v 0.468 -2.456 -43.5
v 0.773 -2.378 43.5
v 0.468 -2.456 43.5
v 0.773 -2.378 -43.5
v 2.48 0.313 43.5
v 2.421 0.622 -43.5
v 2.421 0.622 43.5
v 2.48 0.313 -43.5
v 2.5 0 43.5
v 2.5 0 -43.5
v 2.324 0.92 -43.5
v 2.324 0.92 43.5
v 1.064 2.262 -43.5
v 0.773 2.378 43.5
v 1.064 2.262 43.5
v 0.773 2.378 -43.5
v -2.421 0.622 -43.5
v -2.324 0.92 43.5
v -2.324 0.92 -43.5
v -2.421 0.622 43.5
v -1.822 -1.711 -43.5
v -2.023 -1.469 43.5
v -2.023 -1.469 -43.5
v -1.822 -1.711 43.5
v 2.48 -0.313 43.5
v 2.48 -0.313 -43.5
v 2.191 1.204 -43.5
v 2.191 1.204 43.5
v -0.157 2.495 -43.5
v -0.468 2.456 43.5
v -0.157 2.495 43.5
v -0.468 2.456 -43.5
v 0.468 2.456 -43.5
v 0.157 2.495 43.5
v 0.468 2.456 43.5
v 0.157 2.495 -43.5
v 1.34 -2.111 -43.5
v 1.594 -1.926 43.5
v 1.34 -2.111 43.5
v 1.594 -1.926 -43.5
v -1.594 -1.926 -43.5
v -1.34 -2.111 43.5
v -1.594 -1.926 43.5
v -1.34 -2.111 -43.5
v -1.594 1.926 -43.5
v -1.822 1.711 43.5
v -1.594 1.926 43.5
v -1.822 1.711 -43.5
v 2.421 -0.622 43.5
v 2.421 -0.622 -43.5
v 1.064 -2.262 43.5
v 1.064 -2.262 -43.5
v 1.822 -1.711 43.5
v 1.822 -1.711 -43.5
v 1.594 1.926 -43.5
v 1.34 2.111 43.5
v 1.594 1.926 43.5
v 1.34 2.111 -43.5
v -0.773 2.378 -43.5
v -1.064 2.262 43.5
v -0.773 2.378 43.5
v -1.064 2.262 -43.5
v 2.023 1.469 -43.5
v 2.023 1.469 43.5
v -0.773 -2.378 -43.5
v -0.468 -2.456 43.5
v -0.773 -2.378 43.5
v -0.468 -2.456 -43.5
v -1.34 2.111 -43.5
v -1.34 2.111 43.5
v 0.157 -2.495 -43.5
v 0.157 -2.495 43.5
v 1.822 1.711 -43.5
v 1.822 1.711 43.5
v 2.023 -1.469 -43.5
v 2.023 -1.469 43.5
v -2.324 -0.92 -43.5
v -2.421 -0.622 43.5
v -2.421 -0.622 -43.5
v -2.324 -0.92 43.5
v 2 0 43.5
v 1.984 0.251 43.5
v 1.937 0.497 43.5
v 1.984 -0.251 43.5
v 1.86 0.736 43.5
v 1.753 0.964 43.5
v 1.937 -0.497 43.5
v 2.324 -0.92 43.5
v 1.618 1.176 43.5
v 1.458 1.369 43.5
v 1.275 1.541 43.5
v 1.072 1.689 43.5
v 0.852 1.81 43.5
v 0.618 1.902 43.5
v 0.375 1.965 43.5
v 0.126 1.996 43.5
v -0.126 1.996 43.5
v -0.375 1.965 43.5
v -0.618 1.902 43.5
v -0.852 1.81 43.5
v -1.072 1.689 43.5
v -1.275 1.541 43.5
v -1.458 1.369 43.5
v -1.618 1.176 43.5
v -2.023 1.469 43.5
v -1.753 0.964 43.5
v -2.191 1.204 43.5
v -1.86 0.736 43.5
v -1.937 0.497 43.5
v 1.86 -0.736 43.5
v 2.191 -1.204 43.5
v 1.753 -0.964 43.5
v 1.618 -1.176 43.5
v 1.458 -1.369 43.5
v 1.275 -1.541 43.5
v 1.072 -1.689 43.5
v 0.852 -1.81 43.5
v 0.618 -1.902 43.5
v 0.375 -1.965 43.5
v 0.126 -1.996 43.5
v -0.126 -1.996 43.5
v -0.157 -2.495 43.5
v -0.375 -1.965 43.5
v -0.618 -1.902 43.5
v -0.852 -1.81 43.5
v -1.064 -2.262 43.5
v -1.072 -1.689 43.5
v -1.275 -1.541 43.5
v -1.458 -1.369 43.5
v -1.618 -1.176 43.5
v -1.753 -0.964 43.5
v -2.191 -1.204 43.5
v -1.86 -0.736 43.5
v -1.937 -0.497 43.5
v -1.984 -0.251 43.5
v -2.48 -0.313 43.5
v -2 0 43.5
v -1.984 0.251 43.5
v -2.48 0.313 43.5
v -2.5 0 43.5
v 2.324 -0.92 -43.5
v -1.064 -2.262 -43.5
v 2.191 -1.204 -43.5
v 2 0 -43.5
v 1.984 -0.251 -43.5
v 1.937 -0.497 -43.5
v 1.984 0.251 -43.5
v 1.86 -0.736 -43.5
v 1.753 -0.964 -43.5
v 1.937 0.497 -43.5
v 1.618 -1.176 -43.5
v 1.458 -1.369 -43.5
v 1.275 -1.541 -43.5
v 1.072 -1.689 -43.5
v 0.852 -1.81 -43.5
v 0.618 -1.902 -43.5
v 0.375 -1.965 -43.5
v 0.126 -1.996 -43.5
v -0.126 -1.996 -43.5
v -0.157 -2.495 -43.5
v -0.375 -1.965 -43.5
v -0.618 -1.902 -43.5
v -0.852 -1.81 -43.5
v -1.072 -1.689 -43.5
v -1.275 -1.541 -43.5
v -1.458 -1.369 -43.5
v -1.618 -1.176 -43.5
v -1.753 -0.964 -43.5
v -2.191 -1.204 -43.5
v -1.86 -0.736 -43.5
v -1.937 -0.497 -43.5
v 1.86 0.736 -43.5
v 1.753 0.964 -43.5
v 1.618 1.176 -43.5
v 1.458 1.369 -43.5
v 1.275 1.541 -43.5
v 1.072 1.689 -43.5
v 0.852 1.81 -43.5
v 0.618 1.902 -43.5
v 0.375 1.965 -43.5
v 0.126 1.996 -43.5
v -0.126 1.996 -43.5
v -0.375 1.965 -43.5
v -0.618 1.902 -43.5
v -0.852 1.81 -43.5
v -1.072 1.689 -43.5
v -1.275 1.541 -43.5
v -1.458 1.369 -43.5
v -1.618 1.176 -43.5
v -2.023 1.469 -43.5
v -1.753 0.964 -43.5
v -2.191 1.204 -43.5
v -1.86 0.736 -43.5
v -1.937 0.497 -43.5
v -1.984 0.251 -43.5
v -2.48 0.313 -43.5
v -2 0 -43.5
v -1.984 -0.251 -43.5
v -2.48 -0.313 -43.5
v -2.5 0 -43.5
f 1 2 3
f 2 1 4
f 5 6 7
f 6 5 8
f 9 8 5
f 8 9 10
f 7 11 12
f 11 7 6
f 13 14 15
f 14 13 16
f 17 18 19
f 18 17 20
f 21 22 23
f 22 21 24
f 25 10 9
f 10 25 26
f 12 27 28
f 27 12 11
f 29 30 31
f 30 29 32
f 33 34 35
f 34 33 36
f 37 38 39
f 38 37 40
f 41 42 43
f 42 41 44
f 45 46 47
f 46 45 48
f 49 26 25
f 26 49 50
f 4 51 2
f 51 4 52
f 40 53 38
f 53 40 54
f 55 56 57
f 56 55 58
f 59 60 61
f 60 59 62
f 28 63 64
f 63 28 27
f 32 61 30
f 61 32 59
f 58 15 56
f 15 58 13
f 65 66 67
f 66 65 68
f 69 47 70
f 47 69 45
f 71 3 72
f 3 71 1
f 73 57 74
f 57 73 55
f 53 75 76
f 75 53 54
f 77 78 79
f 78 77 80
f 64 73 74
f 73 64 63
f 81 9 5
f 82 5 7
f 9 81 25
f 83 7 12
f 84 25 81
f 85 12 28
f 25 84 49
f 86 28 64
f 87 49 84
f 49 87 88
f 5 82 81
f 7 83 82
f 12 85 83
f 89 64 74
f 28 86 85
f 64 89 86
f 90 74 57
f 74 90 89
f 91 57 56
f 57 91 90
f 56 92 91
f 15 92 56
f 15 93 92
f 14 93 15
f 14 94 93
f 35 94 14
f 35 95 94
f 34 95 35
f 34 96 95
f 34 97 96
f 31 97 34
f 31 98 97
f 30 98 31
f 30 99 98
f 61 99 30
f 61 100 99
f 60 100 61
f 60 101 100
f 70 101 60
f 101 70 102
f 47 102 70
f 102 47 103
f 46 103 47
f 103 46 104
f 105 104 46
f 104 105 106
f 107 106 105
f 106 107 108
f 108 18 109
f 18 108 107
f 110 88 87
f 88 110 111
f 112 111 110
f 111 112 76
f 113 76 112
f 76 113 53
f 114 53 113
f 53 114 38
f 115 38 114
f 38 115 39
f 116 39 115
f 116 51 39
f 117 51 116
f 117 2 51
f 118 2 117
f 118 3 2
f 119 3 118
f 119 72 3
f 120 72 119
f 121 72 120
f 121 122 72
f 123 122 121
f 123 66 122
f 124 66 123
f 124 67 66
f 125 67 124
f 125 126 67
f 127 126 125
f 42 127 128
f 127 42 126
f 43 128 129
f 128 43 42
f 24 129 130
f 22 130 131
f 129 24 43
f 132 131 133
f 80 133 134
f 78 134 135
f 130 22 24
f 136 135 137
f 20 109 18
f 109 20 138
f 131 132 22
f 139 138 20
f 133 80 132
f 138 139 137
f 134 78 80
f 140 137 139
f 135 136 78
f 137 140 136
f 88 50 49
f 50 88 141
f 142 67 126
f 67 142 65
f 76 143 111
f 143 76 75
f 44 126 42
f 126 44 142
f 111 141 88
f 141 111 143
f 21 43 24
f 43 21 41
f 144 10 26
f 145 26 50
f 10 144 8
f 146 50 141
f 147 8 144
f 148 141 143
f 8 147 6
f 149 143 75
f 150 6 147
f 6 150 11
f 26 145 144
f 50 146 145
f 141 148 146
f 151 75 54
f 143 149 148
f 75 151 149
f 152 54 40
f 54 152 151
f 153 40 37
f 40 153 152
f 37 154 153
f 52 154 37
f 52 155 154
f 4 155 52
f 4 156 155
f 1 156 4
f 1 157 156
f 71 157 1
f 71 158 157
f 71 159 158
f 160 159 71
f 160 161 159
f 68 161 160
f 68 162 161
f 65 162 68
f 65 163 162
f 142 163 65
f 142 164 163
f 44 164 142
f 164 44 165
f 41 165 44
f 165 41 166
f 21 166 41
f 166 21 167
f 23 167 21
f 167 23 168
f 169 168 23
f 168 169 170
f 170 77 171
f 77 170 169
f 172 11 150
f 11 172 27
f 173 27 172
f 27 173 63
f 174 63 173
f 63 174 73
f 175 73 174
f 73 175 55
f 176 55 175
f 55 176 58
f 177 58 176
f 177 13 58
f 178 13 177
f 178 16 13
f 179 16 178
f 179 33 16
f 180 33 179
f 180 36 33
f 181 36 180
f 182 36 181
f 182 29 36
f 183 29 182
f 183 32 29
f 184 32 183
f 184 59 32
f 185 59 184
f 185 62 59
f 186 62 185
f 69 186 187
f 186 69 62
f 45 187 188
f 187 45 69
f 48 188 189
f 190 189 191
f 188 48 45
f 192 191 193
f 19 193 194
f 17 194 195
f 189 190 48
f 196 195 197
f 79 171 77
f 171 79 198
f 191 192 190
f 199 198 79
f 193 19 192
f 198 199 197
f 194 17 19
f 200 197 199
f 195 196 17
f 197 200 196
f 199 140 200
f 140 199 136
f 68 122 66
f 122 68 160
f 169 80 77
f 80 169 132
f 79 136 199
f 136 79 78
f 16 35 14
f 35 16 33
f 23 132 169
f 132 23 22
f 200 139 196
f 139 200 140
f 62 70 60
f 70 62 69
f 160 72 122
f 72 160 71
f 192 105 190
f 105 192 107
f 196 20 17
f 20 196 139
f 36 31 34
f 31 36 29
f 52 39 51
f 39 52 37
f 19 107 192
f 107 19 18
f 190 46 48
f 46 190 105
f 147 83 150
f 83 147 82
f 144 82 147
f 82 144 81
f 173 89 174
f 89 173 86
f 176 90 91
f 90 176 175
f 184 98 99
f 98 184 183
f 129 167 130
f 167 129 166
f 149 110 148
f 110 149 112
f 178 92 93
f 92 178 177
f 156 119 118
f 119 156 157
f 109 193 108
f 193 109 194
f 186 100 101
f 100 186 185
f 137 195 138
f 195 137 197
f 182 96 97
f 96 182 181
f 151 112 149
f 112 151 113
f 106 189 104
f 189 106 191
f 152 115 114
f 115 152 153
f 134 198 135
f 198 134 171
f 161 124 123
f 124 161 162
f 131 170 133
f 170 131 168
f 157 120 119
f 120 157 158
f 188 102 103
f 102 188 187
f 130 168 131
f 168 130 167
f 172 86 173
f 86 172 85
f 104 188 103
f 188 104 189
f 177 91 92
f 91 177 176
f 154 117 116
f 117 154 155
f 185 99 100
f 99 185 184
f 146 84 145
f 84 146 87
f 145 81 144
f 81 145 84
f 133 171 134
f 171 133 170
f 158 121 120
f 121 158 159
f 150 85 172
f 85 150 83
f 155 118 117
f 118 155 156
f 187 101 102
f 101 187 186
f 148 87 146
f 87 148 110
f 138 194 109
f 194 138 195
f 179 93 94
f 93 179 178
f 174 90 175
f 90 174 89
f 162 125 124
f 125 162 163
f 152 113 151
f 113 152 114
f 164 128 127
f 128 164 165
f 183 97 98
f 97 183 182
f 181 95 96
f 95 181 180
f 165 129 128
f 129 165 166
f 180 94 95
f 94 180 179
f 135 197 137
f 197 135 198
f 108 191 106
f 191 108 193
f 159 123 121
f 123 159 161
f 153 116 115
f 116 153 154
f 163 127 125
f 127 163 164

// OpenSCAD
$fn = 50;


difference() {
	union() {
		translate(v = [0, 0, -43.5000000000]) {
			cylinder(h = 87, r = 2.5000000000);
		}
	}
	union() {
		translate(v = [0, 0, -100.0000000000]) {
			cylinder(h = 200, r = 2.0000000000);
		}
	}
}
